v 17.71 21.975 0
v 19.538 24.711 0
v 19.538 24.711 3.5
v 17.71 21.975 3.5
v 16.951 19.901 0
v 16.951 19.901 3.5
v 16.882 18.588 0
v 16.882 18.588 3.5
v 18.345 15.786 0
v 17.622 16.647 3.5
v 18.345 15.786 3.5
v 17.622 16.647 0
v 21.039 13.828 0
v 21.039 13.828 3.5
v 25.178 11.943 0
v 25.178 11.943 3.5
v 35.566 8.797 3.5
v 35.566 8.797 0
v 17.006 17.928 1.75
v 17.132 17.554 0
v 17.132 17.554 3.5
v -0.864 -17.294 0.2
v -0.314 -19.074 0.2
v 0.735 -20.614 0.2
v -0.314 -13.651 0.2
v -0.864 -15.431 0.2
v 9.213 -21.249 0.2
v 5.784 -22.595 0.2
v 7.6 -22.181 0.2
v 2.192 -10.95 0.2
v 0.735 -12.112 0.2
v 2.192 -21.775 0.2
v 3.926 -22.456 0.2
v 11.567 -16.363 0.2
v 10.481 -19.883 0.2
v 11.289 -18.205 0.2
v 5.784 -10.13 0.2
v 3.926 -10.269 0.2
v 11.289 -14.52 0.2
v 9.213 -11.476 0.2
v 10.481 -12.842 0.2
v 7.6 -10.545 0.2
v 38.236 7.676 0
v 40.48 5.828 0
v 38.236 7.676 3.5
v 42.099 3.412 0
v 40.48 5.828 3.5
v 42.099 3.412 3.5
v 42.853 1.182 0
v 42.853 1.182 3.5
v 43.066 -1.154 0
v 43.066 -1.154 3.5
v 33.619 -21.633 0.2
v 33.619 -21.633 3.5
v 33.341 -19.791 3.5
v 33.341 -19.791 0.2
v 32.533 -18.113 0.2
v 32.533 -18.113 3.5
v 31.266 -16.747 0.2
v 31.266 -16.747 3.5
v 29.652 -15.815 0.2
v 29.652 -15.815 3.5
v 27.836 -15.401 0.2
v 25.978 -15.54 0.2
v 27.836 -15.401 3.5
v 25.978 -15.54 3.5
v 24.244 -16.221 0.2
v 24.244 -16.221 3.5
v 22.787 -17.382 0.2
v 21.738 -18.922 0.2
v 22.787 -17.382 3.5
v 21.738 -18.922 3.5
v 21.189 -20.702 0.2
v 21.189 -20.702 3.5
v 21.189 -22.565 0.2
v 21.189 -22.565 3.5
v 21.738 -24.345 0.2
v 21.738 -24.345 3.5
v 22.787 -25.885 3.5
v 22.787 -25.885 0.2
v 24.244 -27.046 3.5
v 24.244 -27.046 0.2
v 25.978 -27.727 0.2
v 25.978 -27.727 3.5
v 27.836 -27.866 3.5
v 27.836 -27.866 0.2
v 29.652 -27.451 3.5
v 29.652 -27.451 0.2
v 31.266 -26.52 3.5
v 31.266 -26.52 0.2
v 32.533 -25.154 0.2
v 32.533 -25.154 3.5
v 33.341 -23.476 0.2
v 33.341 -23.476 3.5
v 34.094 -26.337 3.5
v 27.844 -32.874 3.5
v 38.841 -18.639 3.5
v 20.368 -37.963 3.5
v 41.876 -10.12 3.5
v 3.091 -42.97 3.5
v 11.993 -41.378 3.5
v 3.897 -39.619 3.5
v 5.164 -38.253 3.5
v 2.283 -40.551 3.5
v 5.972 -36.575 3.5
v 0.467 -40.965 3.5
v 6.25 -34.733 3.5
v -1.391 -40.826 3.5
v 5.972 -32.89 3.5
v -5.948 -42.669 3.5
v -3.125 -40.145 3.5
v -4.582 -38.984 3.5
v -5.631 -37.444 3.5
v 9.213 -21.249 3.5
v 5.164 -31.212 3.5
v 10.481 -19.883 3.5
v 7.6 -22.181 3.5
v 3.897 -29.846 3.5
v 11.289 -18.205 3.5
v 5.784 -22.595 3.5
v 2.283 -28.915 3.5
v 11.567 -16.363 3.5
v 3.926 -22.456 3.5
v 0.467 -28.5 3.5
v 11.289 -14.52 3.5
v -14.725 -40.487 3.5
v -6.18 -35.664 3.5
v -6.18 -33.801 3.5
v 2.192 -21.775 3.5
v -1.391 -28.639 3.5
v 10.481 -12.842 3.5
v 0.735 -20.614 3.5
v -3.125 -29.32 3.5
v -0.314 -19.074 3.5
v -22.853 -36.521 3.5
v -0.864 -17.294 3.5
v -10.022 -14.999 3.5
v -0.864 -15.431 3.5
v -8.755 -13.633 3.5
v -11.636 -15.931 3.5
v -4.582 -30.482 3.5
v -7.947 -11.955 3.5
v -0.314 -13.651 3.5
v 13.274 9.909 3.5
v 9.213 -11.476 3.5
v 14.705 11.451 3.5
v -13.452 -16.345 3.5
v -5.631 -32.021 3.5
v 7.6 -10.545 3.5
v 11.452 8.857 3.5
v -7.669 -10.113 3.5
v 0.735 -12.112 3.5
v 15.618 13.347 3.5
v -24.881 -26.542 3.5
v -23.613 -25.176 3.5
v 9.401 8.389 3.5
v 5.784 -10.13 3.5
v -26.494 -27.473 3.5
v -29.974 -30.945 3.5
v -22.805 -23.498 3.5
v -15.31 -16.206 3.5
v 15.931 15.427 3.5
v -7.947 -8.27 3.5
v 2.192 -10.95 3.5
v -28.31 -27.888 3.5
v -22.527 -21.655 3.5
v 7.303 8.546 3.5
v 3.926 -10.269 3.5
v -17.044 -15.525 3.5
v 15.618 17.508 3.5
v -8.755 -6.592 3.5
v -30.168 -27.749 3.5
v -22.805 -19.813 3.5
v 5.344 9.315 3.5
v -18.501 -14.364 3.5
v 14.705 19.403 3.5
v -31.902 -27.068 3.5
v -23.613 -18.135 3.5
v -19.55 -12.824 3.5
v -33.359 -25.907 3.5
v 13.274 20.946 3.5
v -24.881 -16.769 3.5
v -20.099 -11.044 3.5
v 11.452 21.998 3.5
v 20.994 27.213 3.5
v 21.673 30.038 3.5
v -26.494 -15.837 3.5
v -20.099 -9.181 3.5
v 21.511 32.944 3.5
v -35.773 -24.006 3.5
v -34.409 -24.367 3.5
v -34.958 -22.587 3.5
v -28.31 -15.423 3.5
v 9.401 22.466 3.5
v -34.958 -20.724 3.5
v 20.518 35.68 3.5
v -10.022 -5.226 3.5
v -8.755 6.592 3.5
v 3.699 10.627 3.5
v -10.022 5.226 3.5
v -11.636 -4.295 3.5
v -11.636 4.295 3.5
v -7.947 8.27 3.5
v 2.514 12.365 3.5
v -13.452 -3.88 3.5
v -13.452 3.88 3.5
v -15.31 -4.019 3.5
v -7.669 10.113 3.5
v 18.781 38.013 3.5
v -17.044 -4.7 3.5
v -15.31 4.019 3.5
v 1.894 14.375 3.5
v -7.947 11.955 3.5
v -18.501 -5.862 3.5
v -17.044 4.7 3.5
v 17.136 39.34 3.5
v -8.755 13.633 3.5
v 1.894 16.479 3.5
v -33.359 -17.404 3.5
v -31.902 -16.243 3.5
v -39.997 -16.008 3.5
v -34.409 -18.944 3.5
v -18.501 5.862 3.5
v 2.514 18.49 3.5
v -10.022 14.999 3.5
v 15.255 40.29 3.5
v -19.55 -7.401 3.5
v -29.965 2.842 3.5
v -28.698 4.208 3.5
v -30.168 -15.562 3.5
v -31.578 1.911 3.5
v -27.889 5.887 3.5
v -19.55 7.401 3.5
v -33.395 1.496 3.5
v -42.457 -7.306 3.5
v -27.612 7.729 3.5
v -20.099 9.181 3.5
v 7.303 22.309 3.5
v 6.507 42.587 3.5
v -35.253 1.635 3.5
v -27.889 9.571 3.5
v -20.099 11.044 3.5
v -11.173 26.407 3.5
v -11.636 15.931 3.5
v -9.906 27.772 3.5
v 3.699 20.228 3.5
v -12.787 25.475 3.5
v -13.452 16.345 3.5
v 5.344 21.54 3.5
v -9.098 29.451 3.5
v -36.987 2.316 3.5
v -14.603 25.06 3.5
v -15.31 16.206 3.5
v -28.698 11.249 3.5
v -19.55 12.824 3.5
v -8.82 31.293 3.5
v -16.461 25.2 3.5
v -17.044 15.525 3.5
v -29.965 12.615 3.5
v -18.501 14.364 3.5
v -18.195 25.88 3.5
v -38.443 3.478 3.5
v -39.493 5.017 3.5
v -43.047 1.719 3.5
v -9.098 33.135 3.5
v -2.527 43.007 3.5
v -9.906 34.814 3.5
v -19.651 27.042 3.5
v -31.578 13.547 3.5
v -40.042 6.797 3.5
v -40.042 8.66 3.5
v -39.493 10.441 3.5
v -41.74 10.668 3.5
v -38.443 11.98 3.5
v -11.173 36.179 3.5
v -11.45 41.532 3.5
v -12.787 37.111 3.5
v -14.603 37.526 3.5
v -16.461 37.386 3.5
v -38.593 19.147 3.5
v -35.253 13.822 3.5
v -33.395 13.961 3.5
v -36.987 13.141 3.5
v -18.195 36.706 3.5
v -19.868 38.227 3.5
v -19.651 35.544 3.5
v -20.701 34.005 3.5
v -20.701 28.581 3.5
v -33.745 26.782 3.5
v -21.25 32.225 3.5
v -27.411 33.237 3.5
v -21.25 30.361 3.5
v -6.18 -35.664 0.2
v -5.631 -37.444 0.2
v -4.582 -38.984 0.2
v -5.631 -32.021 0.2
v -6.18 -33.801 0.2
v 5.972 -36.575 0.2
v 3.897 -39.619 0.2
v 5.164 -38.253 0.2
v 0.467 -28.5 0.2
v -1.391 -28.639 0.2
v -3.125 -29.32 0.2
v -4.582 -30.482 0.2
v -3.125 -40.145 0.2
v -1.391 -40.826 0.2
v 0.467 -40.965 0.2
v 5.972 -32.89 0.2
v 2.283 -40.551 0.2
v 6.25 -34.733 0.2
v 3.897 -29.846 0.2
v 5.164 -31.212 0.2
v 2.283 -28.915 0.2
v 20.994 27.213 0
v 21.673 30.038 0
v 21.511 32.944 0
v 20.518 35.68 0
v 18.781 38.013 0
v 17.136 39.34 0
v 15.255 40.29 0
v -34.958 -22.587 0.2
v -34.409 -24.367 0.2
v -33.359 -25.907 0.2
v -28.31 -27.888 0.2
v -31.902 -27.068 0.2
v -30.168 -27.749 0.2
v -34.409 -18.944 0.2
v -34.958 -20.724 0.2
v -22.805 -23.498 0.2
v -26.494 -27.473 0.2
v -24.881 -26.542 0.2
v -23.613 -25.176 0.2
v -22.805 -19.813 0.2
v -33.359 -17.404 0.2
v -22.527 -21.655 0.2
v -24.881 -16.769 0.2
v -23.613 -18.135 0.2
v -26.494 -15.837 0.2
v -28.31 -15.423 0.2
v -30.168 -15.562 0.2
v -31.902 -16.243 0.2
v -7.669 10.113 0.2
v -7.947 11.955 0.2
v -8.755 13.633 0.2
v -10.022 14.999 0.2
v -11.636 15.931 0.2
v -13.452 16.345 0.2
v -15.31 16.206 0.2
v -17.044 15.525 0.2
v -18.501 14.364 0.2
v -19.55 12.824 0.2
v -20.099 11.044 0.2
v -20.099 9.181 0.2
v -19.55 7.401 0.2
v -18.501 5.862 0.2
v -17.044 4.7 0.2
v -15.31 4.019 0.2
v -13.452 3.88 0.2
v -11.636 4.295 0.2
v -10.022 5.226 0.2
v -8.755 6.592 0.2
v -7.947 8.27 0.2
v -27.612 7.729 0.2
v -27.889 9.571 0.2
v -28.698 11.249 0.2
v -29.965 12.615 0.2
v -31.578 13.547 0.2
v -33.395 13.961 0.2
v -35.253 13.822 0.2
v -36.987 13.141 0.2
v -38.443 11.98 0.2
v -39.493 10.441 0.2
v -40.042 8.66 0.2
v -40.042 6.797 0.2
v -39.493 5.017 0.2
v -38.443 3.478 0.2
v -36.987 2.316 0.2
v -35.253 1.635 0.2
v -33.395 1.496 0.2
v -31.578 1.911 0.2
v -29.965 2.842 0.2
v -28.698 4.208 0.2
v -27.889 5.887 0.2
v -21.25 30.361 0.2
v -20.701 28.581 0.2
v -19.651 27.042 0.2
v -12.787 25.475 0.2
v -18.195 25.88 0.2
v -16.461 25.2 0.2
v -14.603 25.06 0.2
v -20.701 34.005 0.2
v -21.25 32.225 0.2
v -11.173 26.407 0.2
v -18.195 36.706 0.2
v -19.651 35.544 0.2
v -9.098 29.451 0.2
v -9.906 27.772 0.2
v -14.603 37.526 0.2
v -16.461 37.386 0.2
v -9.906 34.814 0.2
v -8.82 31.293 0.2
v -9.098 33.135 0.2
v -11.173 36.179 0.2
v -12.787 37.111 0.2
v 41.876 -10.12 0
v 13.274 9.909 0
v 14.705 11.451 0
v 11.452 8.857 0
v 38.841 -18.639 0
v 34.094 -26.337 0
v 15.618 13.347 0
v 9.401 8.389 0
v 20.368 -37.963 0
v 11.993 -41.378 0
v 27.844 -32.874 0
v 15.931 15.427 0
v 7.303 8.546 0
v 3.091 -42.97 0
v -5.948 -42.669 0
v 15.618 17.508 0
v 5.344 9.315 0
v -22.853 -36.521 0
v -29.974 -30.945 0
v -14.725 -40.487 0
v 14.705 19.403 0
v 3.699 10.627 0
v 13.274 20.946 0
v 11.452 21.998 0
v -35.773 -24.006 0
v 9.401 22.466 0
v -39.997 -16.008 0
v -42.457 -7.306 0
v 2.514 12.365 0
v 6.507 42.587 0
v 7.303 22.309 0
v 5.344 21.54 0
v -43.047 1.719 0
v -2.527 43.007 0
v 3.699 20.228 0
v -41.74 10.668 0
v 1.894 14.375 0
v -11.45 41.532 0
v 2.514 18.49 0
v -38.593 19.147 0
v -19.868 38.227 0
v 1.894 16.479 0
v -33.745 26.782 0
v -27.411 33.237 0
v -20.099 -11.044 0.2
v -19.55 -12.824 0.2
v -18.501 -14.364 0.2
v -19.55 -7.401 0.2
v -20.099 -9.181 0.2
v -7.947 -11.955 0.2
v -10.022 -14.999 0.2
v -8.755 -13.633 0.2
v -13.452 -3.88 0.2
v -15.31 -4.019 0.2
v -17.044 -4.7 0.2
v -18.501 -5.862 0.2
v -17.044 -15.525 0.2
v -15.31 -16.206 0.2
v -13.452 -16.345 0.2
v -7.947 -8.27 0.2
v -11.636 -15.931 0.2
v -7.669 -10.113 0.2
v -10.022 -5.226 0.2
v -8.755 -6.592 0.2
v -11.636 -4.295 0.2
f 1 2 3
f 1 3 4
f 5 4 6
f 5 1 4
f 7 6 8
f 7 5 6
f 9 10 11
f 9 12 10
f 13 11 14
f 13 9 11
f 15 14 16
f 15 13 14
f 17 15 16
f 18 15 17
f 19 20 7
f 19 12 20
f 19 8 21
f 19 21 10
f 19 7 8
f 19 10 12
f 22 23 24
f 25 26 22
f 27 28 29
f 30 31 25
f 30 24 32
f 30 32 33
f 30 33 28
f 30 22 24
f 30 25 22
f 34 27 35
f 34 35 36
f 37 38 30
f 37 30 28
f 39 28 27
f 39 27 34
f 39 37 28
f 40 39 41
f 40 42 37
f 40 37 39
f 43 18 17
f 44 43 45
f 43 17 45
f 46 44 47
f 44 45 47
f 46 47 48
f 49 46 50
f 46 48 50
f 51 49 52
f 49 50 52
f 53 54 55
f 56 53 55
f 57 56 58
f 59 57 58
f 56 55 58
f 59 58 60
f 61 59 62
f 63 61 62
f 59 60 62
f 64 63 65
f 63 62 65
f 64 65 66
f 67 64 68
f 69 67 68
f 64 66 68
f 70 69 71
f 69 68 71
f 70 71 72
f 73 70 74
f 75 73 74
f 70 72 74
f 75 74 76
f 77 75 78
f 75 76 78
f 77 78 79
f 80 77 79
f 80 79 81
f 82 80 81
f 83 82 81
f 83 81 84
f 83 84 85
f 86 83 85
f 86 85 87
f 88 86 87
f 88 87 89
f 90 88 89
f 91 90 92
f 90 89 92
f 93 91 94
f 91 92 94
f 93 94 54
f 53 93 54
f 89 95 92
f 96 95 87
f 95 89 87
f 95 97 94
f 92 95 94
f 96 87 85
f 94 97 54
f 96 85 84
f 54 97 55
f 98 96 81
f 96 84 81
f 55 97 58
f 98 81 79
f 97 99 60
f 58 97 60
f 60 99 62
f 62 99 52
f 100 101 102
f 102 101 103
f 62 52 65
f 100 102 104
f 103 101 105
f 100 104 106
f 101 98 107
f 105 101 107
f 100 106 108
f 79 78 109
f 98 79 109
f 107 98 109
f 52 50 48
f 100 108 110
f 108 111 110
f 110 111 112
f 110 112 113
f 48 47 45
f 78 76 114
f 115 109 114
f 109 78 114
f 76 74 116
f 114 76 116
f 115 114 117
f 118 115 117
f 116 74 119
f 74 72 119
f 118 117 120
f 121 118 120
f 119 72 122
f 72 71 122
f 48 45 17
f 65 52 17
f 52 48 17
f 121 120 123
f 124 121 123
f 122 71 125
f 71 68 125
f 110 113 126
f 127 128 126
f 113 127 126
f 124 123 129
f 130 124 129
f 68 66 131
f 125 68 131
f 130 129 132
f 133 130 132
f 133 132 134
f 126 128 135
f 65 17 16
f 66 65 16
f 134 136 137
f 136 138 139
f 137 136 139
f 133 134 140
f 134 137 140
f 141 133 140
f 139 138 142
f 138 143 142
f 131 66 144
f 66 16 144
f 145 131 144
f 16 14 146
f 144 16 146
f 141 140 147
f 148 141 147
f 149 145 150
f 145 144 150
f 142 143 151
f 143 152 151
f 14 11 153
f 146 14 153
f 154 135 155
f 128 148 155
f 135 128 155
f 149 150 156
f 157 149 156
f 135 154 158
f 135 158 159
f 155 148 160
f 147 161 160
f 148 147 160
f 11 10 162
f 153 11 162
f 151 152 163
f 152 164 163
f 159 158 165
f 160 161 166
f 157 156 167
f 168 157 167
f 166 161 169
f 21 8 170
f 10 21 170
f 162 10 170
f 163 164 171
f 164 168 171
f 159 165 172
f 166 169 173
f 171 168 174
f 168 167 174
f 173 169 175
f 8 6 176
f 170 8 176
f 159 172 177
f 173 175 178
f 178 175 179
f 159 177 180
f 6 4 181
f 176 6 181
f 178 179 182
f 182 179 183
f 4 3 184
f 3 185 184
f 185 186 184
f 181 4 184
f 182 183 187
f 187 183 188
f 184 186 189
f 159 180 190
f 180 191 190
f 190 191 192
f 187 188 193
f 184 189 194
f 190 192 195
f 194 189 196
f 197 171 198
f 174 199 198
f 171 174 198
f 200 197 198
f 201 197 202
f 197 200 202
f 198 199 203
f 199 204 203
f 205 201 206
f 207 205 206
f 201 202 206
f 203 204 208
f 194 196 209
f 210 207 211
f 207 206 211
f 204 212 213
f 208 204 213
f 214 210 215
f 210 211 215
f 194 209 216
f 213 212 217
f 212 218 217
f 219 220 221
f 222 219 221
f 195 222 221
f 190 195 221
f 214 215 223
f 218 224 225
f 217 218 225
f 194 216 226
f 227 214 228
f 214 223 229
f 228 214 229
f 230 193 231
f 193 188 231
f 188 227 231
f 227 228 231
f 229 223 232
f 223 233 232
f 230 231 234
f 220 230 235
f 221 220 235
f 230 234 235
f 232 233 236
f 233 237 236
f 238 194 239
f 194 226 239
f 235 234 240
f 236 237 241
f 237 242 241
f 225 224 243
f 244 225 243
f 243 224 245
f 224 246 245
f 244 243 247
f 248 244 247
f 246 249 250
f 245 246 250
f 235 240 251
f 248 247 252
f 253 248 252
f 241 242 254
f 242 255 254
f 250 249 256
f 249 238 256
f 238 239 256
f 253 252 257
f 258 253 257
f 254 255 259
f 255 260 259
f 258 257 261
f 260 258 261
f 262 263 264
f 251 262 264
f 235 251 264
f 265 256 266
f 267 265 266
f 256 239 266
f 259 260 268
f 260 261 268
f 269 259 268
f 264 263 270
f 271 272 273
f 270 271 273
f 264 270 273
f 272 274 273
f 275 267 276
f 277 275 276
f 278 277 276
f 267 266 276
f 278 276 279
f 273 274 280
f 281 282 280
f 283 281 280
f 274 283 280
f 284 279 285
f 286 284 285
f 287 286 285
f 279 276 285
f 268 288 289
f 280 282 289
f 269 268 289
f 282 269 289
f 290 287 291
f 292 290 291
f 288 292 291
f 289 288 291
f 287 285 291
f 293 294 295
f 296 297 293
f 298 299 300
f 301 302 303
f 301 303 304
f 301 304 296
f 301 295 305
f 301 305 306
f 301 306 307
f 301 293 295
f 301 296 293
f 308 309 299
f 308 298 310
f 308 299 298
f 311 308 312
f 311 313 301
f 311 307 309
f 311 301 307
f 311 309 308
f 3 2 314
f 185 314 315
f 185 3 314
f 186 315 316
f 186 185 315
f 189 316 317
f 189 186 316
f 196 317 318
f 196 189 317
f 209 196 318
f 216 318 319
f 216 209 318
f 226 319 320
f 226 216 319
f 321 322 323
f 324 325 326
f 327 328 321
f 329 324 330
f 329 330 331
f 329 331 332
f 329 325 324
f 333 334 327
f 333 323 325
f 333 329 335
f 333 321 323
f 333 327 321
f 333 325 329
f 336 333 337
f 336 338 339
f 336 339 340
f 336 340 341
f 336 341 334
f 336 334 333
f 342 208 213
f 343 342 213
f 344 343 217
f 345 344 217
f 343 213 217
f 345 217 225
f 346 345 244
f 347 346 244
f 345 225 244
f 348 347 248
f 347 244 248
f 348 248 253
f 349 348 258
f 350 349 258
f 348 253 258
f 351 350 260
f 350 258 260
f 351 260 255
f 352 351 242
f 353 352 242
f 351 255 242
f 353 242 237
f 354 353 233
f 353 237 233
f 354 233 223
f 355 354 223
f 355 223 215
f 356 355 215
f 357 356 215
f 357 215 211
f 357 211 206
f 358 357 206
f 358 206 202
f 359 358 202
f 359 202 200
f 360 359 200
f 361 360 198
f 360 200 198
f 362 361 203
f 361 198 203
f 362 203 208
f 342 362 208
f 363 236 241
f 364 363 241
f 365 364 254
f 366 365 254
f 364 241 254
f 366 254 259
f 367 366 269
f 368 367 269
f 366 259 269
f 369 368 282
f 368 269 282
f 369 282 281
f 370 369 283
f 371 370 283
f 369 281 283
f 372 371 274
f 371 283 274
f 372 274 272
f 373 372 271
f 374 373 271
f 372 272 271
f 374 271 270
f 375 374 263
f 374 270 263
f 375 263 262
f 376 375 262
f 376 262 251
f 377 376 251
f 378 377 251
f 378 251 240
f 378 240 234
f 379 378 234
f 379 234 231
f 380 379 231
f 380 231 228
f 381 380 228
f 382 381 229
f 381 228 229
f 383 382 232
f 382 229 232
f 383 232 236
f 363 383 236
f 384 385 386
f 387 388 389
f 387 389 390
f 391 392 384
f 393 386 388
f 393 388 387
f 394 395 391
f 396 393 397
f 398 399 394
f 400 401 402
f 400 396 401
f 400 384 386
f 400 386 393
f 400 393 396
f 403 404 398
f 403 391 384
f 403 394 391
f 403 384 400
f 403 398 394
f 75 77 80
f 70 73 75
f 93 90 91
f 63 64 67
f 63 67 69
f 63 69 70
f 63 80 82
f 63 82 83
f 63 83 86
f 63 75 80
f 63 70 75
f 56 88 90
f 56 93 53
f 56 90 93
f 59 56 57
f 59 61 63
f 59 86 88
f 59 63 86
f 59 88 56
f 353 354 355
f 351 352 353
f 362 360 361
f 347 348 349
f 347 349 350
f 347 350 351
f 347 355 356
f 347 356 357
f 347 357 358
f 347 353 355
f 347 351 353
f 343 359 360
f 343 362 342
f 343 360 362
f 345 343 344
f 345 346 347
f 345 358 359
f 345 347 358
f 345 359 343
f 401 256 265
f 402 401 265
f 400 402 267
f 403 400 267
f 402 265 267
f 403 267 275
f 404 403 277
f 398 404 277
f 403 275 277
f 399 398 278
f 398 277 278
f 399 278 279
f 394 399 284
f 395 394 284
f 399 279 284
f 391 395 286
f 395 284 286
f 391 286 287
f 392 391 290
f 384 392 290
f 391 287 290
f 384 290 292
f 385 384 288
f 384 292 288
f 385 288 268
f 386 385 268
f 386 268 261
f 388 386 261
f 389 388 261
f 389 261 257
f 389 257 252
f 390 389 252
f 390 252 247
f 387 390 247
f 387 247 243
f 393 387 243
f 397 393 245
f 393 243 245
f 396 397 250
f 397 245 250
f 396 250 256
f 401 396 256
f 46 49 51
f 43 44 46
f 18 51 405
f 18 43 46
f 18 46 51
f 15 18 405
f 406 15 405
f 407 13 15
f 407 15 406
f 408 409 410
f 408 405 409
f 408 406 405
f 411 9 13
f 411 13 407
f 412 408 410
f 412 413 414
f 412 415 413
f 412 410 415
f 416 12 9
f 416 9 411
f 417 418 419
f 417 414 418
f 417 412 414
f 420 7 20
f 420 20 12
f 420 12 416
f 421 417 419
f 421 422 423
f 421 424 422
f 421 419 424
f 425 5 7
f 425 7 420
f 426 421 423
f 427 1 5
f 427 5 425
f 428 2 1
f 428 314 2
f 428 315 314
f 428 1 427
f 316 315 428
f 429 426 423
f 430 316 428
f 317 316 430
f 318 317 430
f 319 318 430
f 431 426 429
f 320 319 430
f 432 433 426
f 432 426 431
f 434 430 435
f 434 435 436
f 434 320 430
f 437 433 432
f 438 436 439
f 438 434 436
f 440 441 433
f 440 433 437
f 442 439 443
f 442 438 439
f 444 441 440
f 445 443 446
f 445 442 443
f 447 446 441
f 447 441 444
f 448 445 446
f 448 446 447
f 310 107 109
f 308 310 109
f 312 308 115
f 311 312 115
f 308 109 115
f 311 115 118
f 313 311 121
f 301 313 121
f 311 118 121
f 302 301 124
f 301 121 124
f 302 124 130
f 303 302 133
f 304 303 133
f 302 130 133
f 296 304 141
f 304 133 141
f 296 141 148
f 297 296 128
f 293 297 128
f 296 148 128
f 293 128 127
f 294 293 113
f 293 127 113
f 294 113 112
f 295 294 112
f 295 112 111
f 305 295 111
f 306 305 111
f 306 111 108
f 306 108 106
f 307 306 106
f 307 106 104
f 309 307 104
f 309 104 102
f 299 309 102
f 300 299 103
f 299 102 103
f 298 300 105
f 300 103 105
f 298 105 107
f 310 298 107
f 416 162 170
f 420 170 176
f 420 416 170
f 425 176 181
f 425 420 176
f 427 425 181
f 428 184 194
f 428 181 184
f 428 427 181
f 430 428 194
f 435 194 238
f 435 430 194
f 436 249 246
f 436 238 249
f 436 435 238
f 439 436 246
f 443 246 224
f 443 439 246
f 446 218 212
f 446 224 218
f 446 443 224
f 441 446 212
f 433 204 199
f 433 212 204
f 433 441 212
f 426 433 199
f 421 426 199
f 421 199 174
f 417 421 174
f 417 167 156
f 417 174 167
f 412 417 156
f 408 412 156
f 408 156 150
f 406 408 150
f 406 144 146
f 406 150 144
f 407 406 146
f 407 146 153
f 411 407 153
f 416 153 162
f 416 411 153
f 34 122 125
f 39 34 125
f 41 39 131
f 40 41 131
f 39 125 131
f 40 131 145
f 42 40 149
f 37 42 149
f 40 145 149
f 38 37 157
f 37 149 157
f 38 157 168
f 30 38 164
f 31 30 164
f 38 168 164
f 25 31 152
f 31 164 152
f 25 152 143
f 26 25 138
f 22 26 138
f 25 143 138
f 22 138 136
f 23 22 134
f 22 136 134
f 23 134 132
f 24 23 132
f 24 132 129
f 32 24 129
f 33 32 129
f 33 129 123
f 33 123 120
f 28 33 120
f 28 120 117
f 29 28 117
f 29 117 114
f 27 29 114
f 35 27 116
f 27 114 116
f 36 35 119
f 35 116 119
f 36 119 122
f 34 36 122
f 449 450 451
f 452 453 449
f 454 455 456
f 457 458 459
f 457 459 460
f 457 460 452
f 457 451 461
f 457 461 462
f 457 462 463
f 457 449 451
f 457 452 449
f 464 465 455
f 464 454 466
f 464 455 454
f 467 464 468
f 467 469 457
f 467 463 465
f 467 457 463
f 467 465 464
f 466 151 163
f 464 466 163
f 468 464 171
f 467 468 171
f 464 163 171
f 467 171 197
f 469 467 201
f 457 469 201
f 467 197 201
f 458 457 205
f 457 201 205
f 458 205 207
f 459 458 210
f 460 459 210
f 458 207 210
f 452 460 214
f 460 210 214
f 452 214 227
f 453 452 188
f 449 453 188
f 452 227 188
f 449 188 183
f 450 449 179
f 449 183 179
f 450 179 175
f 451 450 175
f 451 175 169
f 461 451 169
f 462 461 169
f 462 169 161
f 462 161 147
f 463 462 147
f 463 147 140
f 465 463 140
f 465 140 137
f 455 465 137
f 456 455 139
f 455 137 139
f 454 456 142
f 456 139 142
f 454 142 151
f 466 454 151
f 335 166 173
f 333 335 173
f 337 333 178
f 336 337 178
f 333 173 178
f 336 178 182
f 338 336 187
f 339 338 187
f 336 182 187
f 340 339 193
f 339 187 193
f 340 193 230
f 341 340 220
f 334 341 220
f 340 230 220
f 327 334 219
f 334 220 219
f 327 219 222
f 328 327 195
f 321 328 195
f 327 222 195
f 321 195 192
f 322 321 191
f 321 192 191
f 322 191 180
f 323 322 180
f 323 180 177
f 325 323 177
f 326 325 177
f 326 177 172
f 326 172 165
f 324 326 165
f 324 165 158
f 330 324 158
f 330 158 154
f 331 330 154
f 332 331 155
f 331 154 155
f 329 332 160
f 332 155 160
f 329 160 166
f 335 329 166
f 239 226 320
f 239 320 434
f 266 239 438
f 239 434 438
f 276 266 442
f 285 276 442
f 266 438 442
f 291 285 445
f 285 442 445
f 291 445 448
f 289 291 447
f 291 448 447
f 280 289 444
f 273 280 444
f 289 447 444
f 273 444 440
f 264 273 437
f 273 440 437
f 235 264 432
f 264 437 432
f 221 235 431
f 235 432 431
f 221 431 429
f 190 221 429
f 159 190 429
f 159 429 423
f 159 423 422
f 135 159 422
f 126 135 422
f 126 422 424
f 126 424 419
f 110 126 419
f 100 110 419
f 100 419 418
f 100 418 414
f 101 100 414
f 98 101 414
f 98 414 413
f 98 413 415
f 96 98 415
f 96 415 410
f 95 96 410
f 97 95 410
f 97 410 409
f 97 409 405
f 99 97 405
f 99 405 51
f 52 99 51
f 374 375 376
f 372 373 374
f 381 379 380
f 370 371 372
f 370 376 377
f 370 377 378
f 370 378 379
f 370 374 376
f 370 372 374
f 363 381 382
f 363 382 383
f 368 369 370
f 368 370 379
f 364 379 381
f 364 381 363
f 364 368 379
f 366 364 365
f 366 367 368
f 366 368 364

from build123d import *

# Parameters (mm, degrees)
F1_DEPTH = 3.5
F2_R     = 7.058260031
F3_DEPTH = 25
F4_R     = 6.25
F5_DEPTH = 3.3
F6_R     = 6.25
F7_DEPTH = 3.3
F8_R     = 10


with BuildPart() as f1:
    # F0 (on Top) → F1 (new body)
    with BuildSketch(Plane.XY):
        with BuildLine():
            add(Edge.make_bspline(
                [(27.7347816335, 32.9664582942), (21.7968576271, 27.4921287364), (8.5785934713, 15.3075413902), (30.4614719911, 10.0037248917), (42.4955969964, 7.0802345045)],
                knots=[0, 0, 0, 0, 0.4495258402, 1, 1, 1, 1], degree=3))
            ThreePointArc((27.7347816335, 32.9664582942), (-37.424599746, -21.3402159917), (42.4955969964, 7.0802345045))
        make_face()
    extrude(amount=F1_DEPTH)

    # F2 (on Top) → F3 (cut)
    with BuildSketch(Plane.XY):
        with Locations((8.8732391596, 15.4273370281)):
            Circle(F2_R)
    extrude(amount=F3_DEPTH, mode=Mode.SUBTRACT)

    # F4 (on face) → F5 (cut)
    with BuildSketch(Plane.XY.offset(3.5)):
        with Locations((-15.0699157128, 31.2930024222)):
            Circle(F4_R)
        with Locations((-33.8617932364, 7.7287333374)):
            Circle(F4_R)
        with Locations((-28.7774891506, -21.6554295879)):
            Circle(F4_R)
        with Locations((0, -34.7326123432)):
            Circle(F4_R)
        with Locations((27.3688023133, -21.6334286339)):
            Circle(F4_R)
    extrude(amount=-F5_DEPTH, mode=Mode.SUBTRACT)

    # F6 (on face) → F7 (cut)
    with BuildSketch(Plane.XY.offset(3.5)):
        with Locations((-13.9189545551, -10.1127124297)):
            Circle(F6_R)
        with Locations((5.3165675522, -16.3627124297)):
            Circle(F6_R)
        with Locations((-13.9189545551, 10.1127124297)):
            Circle(F6_R)
    extrude(amount=-F7_DEPTH, mode=Mode.SUBTRACT)

    # F8
    f8_edges = [f1.edges().sort_by_distance(p)[0] for p in [
        (27.734782, 32.966458, 1.75),
        (42.495597, 7.080235, 1.75),
    ]]
    fillet(f8_edges, radius=F8_R)


solid = f1.part
